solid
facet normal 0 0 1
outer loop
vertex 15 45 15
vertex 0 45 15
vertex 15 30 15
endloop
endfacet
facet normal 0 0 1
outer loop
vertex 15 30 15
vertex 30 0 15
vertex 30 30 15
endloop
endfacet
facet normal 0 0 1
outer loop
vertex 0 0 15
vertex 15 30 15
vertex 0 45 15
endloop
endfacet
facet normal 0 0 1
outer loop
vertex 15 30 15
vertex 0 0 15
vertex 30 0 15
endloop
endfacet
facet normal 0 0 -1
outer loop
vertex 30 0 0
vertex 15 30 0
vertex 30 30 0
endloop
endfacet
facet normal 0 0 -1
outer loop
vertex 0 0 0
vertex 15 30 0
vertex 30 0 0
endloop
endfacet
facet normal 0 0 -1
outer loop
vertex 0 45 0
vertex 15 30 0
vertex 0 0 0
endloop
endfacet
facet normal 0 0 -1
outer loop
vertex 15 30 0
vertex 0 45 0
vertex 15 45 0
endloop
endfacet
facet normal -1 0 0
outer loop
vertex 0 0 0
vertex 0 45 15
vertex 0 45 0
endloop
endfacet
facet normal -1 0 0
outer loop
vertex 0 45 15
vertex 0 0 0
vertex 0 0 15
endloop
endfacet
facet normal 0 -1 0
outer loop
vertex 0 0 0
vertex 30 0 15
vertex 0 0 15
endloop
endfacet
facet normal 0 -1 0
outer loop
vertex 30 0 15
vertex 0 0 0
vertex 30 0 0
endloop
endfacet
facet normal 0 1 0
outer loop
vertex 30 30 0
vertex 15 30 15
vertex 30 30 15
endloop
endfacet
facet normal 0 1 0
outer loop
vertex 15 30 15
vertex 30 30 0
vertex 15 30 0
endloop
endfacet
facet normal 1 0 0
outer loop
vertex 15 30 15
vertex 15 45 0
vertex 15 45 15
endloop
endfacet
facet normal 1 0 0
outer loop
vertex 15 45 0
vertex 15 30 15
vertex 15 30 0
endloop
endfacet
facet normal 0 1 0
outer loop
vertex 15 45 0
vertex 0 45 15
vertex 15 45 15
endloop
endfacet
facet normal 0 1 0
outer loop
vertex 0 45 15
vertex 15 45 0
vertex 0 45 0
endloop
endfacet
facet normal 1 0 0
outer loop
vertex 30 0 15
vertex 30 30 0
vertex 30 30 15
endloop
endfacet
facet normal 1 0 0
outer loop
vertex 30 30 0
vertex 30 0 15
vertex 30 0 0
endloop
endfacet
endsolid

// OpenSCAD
// Fongo piece 7: Step. GPL-3.0; see README.txt.
// All cube positions derive from the canonical catalogue. z points up.
unit = 15; // mm, scale all pieces AND cards together
positions = [[0,0,0],[0,1,0],[0,2,0],[1,0,0],[1,1,0]];
union() { for (p = positions) translate(p * unit) cube([unit, unit, unit]); }
